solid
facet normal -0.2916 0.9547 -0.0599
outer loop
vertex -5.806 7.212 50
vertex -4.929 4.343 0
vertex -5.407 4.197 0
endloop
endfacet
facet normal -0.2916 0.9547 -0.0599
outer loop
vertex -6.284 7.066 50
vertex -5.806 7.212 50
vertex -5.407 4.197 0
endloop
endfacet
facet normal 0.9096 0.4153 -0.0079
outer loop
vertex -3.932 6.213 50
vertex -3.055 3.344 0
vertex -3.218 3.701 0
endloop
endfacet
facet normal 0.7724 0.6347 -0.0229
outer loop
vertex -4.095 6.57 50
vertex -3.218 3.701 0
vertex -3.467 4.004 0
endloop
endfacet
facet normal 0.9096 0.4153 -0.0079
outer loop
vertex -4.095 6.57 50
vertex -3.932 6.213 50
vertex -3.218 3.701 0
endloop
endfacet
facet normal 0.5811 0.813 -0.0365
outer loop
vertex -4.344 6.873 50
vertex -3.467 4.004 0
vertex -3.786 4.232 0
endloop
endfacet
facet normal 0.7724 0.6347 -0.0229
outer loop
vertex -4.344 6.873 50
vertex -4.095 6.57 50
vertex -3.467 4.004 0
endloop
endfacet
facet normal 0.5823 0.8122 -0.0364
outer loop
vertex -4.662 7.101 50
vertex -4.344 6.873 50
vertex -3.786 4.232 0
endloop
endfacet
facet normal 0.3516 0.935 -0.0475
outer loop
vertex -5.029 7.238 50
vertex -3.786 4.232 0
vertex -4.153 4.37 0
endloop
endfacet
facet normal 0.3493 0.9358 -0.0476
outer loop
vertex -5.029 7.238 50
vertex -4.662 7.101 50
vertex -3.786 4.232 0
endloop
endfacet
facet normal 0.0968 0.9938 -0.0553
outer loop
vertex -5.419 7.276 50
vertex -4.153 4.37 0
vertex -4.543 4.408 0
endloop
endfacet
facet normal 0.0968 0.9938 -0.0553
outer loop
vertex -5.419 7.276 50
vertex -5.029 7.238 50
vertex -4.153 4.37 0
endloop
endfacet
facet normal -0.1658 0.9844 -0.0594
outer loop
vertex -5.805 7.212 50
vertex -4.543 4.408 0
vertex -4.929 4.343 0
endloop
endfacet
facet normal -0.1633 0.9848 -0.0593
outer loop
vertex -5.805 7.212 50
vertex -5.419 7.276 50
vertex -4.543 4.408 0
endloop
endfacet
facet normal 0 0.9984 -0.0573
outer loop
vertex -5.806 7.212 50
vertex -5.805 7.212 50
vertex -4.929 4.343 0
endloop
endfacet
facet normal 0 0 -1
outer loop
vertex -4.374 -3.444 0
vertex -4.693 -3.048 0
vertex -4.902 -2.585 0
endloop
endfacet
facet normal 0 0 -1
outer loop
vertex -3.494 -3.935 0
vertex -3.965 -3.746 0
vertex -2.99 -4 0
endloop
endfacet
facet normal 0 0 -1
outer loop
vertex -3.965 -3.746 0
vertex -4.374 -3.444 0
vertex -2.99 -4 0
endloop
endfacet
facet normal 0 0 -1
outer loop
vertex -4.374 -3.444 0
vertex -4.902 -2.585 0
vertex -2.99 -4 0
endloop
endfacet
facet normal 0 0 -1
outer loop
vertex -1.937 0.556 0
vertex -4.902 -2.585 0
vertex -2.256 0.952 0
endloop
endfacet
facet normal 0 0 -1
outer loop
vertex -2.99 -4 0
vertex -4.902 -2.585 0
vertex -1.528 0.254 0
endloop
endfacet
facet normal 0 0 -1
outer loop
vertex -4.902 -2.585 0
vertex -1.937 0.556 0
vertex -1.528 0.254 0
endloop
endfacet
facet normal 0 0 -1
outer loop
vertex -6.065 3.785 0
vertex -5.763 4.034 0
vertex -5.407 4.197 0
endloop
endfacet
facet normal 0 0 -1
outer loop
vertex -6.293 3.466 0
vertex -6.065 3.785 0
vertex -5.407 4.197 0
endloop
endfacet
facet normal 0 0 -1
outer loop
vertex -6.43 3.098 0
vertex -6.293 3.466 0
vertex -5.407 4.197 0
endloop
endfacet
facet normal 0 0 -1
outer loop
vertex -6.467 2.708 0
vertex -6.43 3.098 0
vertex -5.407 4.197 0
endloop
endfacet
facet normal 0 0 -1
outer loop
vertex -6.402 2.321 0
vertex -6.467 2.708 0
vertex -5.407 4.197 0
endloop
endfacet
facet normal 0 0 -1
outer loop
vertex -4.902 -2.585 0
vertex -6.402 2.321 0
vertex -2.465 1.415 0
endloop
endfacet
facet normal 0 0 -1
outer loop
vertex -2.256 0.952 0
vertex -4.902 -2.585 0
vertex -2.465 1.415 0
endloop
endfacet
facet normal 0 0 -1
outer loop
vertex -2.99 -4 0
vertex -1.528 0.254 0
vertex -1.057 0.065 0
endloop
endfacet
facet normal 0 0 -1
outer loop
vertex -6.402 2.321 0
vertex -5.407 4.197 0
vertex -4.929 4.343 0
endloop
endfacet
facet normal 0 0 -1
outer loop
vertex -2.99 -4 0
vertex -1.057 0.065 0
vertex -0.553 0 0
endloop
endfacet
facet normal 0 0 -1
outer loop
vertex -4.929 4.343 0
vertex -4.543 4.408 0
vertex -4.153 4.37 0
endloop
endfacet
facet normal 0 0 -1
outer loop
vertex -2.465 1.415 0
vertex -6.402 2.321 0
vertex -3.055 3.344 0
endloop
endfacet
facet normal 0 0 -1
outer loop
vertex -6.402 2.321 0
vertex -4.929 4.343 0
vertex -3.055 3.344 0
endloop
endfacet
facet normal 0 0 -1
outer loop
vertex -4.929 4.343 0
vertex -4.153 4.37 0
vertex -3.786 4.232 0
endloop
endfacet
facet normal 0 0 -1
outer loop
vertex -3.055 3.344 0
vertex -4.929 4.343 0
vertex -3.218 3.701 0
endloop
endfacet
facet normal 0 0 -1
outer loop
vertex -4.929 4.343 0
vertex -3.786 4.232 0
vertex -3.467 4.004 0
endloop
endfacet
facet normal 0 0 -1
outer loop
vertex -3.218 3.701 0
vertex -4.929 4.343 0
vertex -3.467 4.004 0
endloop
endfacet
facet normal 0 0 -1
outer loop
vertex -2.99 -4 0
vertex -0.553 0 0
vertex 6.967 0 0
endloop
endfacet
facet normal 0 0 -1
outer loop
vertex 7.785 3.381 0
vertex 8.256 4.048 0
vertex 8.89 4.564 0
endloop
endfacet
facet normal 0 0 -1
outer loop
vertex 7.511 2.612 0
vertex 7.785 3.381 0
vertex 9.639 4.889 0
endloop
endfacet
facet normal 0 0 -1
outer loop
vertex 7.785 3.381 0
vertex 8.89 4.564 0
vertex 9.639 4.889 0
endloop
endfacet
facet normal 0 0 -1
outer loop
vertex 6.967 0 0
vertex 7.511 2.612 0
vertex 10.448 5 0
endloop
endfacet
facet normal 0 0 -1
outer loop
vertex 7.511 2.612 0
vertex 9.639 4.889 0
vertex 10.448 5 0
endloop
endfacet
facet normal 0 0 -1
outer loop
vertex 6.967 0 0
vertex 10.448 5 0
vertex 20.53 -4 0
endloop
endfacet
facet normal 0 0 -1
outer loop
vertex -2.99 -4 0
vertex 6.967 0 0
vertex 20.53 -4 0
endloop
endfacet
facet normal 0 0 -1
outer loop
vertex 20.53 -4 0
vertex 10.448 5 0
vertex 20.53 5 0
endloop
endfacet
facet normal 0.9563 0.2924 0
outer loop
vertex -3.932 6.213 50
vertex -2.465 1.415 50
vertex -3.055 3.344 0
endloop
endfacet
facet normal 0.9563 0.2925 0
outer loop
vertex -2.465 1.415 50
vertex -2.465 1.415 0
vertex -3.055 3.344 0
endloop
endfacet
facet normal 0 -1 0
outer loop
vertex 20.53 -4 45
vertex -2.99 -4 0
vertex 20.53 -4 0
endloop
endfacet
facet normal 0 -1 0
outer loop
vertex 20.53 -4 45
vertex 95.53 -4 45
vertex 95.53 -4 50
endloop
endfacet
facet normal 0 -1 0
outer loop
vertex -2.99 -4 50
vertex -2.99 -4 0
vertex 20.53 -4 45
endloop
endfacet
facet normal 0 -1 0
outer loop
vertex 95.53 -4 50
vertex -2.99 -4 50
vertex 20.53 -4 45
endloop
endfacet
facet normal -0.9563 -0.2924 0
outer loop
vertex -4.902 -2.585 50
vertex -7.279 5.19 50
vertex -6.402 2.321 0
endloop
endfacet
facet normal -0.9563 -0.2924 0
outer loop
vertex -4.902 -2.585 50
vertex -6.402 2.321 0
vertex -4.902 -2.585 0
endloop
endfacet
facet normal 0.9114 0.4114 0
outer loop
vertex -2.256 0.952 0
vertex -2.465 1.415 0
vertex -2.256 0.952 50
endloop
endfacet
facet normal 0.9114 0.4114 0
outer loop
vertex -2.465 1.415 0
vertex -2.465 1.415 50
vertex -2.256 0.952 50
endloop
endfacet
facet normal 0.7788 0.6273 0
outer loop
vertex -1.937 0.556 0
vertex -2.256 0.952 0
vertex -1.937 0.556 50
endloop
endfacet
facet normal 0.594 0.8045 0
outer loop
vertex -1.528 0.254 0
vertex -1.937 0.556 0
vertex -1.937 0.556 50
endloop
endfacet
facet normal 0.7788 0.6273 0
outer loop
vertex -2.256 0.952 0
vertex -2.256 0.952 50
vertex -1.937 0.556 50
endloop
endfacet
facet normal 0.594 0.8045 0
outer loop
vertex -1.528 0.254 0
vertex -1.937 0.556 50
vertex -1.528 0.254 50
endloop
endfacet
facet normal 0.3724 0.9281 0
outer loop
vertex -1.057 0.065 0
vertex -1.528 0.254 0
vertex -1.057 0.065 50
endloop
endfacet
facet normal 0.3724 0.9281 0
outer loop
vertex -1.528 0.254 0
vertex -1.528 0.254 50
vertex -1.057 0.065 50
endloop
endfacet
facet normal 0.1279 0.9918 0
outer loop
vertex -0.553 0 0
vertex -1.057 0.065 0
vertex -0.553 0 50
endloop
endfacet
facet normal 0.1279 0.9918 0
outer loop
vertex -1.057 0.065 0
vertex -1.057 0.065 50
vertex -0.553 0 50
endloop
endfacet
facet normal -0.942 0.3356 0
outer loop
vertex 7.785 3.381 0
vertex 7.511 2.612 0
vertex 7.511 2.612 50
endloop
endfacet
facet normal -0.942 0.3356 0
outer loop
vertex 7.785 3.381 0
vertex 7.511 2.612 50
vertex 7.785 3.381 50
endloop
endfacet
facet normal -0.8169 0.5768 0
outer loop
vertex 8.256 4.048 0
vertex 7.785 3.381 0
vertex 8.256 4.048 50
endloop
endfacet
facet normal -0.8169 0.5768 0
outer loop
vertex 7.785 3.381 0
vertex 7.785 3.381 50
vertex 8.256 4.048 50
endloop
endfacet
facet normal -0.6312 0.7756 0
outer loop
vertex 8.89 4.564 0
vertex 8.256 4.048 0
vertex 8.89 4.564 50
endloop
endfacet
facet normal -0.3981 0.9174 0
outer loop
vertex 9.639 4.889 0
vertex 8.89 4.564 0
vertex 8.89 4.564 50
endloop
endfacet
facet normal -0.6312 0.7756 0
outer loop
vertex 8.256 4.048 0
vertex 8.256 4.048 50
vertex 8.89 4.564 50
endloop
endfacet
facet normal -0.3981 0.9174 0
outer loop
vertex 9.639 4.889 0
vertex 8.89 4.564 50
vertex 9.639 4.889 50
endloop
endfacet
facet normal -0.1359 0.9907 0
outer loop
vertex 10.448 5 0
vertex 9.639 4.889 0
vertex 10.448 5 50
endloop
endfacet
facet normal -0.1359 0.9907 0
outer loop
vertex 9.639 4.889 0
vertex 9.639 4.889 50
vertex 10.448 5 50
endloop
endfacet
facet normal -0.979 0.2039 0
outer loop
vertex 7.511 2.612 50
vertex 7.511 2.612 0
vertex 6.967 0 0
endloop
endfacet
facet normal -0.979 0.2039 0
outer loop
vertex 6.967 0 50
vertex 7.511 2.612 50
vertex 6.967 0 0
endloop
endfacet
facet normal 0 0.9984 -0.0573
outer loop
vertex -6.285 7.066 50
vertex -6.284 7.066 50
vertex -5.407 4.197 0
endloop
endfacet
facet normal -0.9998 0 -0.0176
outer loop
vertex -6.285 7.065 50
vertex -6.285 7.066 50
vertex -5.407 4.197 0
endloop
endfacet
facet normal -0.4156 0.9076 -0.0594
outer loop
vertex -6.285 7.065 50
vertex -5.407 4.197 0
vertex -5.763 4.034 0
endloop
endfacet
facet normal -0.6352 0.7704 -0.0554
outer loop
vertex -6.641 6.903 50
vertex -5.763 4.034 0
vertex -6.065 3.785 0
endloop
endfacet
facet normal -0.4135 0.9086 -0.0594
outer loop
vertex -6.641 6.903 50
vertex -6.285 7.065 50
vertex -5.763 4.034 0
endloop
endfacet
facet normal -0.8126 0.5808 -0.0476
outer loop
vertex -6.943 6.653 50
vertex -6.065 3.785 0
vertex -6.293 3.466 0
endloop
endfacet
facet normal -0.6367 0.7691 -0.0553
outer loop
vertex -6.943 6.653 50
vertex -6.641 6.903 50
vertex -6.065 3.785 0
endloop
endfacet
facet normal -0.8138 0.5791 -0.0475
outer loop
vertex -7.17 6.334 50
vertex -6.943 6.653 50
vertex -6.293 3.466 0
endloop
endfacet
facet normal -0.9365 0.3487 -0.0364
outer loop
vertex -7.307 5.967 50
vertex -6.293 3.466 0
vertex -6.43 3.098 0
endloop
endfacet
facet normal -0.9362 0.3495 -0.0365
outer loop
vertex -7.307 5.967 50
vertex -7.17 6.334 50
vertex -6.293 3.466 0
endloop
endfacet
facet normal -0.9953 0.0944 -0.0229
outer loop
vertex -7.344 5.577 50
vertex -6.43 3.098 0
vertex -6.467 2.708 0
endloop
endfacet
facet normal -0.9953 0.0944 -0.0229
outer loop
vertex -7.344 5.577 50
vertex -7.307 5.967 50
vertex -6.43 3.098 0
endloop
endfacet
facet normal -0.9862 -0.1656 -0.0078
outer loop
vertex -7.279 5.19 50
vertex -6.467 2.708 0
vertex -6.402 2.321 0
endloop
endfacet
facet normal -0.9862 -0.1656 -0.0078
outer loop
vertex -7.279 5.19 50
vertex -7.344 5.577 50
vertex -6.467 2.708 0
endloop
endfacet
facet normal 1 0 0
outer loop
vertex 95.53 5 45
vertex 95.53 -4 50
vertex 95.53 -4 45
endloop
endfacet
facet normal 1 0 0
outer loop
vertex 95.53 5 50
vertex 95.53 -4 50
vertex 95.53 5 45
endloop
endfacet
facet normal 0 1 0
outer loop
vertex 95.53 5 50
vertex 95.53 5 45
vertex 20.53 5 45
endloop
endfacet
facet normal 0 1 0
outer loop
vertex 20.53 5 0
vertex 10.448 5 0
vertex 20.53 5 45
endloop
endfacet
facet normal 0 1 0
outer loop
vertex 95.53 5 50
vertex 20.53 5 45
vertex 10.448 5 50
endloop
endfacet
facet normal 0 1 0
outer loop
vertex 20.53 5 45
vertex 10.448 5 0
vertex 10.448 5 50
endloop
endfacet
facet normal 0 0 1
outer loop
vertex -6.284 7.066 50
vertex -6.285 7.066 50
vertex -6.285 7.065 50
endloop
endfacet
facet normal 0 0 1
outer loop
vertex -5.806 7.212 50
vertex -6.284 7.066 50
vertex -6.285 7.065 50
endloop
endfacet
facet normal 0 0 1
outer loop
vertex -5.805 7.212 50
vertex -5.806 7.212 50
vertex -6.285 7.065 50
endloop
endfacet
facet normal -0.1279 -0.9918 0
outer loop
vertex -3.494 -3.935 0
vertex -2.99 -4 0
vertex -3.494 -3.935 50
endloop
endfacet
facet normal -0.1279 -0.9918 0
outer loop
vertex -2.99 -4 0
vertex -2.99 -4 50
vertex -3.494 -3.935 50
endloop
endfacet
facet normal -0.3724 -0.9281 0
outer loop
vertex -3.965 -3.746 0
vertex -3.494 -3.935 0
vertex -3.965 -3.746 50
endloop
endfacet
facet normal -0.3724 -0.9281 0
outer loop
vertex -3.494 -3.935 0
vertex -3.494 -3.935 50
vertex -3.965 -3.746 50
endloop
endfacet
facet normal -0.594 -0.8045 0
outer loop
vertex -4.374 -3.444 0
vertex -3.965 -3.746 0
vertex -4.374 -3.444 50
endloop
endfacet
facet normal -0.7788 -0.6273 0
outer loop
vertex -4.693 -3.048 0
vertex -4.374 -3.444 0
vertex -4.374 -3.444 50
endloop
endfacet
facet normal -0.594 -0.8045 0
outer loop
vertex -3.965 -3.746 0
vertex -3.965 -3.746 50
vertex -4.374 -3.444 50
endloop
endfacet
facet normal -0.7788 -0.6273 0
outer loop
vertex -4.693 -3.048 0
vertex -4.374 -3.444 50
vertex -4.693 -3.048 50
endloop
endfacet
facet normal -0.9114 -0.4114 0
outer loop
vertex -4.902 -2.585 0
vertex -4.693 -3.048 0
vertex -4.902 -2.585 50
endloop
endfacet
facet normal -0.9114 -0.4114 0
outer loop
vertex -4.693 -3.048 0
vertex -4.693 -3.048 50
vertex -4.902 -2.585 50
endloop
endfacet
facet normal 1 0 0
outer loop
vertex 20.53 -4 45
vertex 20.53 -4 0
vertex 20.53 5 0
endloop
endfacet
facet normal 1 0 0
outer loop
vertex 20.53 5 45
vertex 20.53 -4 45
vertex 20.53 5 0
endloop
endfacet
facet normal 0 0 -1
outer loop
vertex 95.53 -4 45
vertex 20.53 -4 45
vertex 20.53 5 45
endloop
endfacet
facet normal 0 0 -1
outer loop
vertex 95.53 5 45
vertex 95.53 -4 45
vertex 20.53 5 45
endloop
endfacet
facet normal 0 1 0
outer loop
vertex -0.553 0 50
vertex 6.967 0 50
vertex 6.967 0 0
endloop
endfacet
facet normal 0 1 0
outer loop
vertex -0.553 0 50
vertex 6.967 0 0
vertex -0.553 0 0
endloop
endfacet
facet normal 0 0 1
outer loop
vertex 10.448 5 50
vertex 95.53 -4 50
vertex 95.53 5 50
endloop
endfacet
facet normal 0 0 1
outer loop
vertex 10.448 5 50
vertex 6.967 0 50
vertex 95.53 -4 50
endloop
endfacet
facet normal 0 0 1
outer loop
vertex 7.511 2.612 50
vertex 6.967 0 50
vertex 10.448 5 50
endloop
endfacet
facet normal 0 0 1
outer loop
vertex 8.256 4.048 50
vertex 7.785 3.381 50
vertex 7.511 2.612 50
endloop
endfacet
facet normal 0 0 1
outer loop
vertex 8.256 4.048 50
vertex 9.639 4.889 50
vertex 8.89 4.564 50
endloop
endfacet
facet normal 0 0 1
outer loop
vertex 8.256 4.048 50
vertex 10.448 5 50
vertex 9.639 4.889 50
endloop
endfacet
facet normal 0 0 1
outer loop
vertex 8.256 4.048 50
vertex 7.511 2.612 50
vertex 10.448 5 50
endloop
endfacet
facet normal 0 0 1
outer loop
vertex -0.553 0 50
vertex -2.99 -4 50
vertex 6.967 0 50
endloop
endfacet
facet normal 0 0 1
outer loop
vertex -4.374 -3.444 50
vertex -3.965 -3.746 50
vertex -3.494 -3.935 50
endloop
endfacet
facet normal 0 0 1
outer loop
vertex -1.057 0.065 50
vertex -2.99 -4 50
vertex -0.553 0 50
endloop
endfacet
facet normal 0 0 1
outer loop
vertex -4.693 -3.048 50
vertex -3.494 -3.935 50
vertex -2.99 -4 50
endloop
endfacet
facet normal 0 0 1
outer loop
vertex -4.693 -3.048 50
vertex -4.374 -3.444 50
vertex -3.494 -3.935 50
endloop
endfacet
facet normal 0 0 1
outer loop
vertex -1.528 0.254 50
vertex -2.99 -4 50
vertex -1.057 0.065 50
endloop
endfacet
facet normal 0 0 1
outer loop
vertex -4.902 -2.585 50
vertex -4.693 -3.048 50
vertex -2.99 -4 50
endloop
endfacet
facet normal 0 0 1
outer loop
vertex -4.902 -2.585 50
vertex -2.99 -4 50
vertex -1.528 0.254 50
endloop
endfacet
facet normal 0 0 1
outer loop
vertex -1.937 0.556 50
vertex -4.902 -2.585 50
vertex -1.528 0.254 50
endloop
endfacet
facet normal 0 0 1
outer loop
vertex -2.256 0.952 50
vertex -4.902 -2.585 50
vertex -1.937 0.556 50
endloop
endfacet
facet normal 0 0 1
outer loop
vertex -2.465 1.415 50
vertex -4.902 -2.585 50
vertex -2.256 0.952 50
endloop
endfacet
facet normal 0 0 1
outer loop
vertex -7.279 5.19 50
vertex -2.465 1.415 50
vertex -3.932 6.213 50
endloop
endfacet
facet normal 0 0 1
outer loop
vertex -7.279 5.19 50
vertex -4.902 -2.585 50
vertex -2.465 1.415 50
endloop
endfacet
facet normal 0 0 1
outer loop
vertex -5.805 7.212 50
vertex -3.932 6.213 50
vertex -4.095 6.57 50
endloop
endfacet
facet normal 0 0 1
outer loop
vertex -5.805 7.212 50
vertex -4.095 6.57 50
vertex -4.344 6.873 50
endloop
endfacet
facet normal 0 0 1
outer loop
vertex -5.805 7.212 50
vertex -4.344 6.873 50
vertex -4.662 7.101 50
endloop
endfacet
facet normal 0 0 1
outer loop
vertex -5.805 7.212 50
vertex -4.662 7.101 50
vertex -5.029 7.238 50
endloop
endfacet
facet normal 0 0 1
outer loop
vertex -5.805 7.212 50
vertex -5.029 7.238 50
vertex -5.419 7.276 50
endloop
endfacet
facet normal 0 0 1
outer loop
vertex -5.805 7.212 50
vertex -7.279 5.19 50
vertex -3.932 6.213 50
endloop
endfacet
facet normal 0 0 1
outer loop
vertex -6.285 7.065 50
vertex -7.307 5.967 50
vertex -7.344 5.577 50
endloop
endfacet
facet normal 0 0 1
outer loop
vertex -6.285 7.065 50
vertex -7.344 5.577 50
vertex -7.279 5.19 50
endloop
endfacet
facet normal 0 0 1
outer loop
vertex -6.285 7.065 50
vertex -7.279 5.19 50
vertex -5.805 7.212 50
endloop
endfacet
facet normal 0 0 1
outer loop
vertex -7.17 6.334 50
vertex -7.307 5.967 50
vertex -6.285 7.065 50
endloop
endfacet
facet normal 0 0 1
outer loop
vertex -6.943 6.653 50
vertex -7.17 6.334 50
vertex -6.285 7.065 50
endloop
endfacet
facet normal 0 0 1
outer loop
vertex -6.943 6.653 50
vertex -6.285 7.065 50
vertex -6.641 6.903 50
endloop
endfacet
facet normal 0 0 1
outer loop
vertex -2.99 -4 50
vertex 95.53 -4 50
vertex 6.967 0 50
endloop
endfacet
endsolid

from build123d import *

# Parameters (mm, degrees)
F1_DEPTH    = 50
F2_SIZE2    = 2.99999
F2_SIZE     = 49.99999
F3_T1_DEPTH = 57.5899085645
F4_R        = 2
F5_R        = 3
F6_W        = 9
F6_H        = 5
F7_DEPTH    = 75
F8_R        = 2


# Not quite as in the source:
# - a fillet or chamfer that OpenCascade refuses, or shapes differently, is made with other operations: its cross-section is extruded or revolved along the edge and cut away or added
# - a fillet or chamfer is up to 0.001 mm smaller than in the source, because OpenCascade refuses the exact size


with BuildPart() as f1:
    # F0 (on Top) → F1 (new body)
    with BuildSketch(Plane.XY):
        Polygon((-4.3715766435, 7.6504380477), (-7.7186432894, 6.6271370812), (-4.4696014276, -4), (20.5303985724, -4), (20.5303985724, 5), (8.0088521886, 5), (6.9673969943, 0), (-2.0326030057, 0), align=None)
    extrude(amount=F1_DEPTH)

    # F2 (size 50 and 3 in the source; OpenCascade refuses exactly that, so slightly less here)
    f2_edges = [f1.edges().sort_by_distance(p)[0] for p in [
        (-6.04511, 7.138788, 0),
    ]]
    f2_side = f1.faces().sort_by_distance((-6.04511, 7.138788, 25))[0]
    chamfer(f2_edges, length=F2_SIZE, length2=F2_SIZE2, reference=f2_side)

    # F3: fillet of radius 1.5 on 2 edges, made by hand

    # F3_s2 → F3_t1 (cut)
    with BuildSketch(Plane(origin=(-0.948644568, 3.1028765694, 54.0777102773), x_dir=(0.956304756, 0.2923717047, 0), z_dir=(0.0175107565, -0.0572751036, -0.9982048567))):
        with BuildLine():
            ThreePointArc((-1.9437879213, -4.0842430614), (-2.3831277496, -5.1449032332), (-3.4437879213, -5.5842430614))
            Line((-3.4437879213, -5.5842430614), (-1.9437879213, -5.5842430614))
            Line((-1.9437879213, -5.5842430614), (-1.9437879213, -4.0842430614))
        make_face()
        with BuildLine():
            ThreePointArc((-3.9437879213, -5.5842430614), (-5.0044480931, -5.1449032332), (-5.4437879213, -4.0842430614))
            Line((-5.4437879213, -4.0842430614), (-5.4437879213, -5.5842430614))
            Line((-5.4437879213, -5.5842430614), (-3.9437879213, -5.5842430614))
        make_face()
    extrude(amount=F3_T1_DEPTH, mode=Mode.SUBTRACT)

    # F4
    f4_edges = [f1.edges().sort_by_distance(p)[0] for p in [
        (-2.032603, 0, 25),
    ]]
    fillet(f4_edges, radius=F4_R)

    # F5
    f5_edges = [f1.edges().sort_by_distance(p)[0] for p in [
        (8.008852, 5, 25),
    ]]
    fillet(f5_edges, radius=F5_R)

    # F6 (on face) → F7 (join)
    with BuildSketch(Plane.YZ.offset(20.5303985724)):
        with Locations((0.5, 47.5)):
            Rectangle(F6_W, F6_H)
    extrude(amount=F7_DEPTH)

    # F8
    f8_edges = [f1.edges().sort_by_distance(p)[0] for p in [
        (-4.469601, -4, 25),
    ]]
    fillet(f8_edges, radius=F8_R)


solid = f1.part
